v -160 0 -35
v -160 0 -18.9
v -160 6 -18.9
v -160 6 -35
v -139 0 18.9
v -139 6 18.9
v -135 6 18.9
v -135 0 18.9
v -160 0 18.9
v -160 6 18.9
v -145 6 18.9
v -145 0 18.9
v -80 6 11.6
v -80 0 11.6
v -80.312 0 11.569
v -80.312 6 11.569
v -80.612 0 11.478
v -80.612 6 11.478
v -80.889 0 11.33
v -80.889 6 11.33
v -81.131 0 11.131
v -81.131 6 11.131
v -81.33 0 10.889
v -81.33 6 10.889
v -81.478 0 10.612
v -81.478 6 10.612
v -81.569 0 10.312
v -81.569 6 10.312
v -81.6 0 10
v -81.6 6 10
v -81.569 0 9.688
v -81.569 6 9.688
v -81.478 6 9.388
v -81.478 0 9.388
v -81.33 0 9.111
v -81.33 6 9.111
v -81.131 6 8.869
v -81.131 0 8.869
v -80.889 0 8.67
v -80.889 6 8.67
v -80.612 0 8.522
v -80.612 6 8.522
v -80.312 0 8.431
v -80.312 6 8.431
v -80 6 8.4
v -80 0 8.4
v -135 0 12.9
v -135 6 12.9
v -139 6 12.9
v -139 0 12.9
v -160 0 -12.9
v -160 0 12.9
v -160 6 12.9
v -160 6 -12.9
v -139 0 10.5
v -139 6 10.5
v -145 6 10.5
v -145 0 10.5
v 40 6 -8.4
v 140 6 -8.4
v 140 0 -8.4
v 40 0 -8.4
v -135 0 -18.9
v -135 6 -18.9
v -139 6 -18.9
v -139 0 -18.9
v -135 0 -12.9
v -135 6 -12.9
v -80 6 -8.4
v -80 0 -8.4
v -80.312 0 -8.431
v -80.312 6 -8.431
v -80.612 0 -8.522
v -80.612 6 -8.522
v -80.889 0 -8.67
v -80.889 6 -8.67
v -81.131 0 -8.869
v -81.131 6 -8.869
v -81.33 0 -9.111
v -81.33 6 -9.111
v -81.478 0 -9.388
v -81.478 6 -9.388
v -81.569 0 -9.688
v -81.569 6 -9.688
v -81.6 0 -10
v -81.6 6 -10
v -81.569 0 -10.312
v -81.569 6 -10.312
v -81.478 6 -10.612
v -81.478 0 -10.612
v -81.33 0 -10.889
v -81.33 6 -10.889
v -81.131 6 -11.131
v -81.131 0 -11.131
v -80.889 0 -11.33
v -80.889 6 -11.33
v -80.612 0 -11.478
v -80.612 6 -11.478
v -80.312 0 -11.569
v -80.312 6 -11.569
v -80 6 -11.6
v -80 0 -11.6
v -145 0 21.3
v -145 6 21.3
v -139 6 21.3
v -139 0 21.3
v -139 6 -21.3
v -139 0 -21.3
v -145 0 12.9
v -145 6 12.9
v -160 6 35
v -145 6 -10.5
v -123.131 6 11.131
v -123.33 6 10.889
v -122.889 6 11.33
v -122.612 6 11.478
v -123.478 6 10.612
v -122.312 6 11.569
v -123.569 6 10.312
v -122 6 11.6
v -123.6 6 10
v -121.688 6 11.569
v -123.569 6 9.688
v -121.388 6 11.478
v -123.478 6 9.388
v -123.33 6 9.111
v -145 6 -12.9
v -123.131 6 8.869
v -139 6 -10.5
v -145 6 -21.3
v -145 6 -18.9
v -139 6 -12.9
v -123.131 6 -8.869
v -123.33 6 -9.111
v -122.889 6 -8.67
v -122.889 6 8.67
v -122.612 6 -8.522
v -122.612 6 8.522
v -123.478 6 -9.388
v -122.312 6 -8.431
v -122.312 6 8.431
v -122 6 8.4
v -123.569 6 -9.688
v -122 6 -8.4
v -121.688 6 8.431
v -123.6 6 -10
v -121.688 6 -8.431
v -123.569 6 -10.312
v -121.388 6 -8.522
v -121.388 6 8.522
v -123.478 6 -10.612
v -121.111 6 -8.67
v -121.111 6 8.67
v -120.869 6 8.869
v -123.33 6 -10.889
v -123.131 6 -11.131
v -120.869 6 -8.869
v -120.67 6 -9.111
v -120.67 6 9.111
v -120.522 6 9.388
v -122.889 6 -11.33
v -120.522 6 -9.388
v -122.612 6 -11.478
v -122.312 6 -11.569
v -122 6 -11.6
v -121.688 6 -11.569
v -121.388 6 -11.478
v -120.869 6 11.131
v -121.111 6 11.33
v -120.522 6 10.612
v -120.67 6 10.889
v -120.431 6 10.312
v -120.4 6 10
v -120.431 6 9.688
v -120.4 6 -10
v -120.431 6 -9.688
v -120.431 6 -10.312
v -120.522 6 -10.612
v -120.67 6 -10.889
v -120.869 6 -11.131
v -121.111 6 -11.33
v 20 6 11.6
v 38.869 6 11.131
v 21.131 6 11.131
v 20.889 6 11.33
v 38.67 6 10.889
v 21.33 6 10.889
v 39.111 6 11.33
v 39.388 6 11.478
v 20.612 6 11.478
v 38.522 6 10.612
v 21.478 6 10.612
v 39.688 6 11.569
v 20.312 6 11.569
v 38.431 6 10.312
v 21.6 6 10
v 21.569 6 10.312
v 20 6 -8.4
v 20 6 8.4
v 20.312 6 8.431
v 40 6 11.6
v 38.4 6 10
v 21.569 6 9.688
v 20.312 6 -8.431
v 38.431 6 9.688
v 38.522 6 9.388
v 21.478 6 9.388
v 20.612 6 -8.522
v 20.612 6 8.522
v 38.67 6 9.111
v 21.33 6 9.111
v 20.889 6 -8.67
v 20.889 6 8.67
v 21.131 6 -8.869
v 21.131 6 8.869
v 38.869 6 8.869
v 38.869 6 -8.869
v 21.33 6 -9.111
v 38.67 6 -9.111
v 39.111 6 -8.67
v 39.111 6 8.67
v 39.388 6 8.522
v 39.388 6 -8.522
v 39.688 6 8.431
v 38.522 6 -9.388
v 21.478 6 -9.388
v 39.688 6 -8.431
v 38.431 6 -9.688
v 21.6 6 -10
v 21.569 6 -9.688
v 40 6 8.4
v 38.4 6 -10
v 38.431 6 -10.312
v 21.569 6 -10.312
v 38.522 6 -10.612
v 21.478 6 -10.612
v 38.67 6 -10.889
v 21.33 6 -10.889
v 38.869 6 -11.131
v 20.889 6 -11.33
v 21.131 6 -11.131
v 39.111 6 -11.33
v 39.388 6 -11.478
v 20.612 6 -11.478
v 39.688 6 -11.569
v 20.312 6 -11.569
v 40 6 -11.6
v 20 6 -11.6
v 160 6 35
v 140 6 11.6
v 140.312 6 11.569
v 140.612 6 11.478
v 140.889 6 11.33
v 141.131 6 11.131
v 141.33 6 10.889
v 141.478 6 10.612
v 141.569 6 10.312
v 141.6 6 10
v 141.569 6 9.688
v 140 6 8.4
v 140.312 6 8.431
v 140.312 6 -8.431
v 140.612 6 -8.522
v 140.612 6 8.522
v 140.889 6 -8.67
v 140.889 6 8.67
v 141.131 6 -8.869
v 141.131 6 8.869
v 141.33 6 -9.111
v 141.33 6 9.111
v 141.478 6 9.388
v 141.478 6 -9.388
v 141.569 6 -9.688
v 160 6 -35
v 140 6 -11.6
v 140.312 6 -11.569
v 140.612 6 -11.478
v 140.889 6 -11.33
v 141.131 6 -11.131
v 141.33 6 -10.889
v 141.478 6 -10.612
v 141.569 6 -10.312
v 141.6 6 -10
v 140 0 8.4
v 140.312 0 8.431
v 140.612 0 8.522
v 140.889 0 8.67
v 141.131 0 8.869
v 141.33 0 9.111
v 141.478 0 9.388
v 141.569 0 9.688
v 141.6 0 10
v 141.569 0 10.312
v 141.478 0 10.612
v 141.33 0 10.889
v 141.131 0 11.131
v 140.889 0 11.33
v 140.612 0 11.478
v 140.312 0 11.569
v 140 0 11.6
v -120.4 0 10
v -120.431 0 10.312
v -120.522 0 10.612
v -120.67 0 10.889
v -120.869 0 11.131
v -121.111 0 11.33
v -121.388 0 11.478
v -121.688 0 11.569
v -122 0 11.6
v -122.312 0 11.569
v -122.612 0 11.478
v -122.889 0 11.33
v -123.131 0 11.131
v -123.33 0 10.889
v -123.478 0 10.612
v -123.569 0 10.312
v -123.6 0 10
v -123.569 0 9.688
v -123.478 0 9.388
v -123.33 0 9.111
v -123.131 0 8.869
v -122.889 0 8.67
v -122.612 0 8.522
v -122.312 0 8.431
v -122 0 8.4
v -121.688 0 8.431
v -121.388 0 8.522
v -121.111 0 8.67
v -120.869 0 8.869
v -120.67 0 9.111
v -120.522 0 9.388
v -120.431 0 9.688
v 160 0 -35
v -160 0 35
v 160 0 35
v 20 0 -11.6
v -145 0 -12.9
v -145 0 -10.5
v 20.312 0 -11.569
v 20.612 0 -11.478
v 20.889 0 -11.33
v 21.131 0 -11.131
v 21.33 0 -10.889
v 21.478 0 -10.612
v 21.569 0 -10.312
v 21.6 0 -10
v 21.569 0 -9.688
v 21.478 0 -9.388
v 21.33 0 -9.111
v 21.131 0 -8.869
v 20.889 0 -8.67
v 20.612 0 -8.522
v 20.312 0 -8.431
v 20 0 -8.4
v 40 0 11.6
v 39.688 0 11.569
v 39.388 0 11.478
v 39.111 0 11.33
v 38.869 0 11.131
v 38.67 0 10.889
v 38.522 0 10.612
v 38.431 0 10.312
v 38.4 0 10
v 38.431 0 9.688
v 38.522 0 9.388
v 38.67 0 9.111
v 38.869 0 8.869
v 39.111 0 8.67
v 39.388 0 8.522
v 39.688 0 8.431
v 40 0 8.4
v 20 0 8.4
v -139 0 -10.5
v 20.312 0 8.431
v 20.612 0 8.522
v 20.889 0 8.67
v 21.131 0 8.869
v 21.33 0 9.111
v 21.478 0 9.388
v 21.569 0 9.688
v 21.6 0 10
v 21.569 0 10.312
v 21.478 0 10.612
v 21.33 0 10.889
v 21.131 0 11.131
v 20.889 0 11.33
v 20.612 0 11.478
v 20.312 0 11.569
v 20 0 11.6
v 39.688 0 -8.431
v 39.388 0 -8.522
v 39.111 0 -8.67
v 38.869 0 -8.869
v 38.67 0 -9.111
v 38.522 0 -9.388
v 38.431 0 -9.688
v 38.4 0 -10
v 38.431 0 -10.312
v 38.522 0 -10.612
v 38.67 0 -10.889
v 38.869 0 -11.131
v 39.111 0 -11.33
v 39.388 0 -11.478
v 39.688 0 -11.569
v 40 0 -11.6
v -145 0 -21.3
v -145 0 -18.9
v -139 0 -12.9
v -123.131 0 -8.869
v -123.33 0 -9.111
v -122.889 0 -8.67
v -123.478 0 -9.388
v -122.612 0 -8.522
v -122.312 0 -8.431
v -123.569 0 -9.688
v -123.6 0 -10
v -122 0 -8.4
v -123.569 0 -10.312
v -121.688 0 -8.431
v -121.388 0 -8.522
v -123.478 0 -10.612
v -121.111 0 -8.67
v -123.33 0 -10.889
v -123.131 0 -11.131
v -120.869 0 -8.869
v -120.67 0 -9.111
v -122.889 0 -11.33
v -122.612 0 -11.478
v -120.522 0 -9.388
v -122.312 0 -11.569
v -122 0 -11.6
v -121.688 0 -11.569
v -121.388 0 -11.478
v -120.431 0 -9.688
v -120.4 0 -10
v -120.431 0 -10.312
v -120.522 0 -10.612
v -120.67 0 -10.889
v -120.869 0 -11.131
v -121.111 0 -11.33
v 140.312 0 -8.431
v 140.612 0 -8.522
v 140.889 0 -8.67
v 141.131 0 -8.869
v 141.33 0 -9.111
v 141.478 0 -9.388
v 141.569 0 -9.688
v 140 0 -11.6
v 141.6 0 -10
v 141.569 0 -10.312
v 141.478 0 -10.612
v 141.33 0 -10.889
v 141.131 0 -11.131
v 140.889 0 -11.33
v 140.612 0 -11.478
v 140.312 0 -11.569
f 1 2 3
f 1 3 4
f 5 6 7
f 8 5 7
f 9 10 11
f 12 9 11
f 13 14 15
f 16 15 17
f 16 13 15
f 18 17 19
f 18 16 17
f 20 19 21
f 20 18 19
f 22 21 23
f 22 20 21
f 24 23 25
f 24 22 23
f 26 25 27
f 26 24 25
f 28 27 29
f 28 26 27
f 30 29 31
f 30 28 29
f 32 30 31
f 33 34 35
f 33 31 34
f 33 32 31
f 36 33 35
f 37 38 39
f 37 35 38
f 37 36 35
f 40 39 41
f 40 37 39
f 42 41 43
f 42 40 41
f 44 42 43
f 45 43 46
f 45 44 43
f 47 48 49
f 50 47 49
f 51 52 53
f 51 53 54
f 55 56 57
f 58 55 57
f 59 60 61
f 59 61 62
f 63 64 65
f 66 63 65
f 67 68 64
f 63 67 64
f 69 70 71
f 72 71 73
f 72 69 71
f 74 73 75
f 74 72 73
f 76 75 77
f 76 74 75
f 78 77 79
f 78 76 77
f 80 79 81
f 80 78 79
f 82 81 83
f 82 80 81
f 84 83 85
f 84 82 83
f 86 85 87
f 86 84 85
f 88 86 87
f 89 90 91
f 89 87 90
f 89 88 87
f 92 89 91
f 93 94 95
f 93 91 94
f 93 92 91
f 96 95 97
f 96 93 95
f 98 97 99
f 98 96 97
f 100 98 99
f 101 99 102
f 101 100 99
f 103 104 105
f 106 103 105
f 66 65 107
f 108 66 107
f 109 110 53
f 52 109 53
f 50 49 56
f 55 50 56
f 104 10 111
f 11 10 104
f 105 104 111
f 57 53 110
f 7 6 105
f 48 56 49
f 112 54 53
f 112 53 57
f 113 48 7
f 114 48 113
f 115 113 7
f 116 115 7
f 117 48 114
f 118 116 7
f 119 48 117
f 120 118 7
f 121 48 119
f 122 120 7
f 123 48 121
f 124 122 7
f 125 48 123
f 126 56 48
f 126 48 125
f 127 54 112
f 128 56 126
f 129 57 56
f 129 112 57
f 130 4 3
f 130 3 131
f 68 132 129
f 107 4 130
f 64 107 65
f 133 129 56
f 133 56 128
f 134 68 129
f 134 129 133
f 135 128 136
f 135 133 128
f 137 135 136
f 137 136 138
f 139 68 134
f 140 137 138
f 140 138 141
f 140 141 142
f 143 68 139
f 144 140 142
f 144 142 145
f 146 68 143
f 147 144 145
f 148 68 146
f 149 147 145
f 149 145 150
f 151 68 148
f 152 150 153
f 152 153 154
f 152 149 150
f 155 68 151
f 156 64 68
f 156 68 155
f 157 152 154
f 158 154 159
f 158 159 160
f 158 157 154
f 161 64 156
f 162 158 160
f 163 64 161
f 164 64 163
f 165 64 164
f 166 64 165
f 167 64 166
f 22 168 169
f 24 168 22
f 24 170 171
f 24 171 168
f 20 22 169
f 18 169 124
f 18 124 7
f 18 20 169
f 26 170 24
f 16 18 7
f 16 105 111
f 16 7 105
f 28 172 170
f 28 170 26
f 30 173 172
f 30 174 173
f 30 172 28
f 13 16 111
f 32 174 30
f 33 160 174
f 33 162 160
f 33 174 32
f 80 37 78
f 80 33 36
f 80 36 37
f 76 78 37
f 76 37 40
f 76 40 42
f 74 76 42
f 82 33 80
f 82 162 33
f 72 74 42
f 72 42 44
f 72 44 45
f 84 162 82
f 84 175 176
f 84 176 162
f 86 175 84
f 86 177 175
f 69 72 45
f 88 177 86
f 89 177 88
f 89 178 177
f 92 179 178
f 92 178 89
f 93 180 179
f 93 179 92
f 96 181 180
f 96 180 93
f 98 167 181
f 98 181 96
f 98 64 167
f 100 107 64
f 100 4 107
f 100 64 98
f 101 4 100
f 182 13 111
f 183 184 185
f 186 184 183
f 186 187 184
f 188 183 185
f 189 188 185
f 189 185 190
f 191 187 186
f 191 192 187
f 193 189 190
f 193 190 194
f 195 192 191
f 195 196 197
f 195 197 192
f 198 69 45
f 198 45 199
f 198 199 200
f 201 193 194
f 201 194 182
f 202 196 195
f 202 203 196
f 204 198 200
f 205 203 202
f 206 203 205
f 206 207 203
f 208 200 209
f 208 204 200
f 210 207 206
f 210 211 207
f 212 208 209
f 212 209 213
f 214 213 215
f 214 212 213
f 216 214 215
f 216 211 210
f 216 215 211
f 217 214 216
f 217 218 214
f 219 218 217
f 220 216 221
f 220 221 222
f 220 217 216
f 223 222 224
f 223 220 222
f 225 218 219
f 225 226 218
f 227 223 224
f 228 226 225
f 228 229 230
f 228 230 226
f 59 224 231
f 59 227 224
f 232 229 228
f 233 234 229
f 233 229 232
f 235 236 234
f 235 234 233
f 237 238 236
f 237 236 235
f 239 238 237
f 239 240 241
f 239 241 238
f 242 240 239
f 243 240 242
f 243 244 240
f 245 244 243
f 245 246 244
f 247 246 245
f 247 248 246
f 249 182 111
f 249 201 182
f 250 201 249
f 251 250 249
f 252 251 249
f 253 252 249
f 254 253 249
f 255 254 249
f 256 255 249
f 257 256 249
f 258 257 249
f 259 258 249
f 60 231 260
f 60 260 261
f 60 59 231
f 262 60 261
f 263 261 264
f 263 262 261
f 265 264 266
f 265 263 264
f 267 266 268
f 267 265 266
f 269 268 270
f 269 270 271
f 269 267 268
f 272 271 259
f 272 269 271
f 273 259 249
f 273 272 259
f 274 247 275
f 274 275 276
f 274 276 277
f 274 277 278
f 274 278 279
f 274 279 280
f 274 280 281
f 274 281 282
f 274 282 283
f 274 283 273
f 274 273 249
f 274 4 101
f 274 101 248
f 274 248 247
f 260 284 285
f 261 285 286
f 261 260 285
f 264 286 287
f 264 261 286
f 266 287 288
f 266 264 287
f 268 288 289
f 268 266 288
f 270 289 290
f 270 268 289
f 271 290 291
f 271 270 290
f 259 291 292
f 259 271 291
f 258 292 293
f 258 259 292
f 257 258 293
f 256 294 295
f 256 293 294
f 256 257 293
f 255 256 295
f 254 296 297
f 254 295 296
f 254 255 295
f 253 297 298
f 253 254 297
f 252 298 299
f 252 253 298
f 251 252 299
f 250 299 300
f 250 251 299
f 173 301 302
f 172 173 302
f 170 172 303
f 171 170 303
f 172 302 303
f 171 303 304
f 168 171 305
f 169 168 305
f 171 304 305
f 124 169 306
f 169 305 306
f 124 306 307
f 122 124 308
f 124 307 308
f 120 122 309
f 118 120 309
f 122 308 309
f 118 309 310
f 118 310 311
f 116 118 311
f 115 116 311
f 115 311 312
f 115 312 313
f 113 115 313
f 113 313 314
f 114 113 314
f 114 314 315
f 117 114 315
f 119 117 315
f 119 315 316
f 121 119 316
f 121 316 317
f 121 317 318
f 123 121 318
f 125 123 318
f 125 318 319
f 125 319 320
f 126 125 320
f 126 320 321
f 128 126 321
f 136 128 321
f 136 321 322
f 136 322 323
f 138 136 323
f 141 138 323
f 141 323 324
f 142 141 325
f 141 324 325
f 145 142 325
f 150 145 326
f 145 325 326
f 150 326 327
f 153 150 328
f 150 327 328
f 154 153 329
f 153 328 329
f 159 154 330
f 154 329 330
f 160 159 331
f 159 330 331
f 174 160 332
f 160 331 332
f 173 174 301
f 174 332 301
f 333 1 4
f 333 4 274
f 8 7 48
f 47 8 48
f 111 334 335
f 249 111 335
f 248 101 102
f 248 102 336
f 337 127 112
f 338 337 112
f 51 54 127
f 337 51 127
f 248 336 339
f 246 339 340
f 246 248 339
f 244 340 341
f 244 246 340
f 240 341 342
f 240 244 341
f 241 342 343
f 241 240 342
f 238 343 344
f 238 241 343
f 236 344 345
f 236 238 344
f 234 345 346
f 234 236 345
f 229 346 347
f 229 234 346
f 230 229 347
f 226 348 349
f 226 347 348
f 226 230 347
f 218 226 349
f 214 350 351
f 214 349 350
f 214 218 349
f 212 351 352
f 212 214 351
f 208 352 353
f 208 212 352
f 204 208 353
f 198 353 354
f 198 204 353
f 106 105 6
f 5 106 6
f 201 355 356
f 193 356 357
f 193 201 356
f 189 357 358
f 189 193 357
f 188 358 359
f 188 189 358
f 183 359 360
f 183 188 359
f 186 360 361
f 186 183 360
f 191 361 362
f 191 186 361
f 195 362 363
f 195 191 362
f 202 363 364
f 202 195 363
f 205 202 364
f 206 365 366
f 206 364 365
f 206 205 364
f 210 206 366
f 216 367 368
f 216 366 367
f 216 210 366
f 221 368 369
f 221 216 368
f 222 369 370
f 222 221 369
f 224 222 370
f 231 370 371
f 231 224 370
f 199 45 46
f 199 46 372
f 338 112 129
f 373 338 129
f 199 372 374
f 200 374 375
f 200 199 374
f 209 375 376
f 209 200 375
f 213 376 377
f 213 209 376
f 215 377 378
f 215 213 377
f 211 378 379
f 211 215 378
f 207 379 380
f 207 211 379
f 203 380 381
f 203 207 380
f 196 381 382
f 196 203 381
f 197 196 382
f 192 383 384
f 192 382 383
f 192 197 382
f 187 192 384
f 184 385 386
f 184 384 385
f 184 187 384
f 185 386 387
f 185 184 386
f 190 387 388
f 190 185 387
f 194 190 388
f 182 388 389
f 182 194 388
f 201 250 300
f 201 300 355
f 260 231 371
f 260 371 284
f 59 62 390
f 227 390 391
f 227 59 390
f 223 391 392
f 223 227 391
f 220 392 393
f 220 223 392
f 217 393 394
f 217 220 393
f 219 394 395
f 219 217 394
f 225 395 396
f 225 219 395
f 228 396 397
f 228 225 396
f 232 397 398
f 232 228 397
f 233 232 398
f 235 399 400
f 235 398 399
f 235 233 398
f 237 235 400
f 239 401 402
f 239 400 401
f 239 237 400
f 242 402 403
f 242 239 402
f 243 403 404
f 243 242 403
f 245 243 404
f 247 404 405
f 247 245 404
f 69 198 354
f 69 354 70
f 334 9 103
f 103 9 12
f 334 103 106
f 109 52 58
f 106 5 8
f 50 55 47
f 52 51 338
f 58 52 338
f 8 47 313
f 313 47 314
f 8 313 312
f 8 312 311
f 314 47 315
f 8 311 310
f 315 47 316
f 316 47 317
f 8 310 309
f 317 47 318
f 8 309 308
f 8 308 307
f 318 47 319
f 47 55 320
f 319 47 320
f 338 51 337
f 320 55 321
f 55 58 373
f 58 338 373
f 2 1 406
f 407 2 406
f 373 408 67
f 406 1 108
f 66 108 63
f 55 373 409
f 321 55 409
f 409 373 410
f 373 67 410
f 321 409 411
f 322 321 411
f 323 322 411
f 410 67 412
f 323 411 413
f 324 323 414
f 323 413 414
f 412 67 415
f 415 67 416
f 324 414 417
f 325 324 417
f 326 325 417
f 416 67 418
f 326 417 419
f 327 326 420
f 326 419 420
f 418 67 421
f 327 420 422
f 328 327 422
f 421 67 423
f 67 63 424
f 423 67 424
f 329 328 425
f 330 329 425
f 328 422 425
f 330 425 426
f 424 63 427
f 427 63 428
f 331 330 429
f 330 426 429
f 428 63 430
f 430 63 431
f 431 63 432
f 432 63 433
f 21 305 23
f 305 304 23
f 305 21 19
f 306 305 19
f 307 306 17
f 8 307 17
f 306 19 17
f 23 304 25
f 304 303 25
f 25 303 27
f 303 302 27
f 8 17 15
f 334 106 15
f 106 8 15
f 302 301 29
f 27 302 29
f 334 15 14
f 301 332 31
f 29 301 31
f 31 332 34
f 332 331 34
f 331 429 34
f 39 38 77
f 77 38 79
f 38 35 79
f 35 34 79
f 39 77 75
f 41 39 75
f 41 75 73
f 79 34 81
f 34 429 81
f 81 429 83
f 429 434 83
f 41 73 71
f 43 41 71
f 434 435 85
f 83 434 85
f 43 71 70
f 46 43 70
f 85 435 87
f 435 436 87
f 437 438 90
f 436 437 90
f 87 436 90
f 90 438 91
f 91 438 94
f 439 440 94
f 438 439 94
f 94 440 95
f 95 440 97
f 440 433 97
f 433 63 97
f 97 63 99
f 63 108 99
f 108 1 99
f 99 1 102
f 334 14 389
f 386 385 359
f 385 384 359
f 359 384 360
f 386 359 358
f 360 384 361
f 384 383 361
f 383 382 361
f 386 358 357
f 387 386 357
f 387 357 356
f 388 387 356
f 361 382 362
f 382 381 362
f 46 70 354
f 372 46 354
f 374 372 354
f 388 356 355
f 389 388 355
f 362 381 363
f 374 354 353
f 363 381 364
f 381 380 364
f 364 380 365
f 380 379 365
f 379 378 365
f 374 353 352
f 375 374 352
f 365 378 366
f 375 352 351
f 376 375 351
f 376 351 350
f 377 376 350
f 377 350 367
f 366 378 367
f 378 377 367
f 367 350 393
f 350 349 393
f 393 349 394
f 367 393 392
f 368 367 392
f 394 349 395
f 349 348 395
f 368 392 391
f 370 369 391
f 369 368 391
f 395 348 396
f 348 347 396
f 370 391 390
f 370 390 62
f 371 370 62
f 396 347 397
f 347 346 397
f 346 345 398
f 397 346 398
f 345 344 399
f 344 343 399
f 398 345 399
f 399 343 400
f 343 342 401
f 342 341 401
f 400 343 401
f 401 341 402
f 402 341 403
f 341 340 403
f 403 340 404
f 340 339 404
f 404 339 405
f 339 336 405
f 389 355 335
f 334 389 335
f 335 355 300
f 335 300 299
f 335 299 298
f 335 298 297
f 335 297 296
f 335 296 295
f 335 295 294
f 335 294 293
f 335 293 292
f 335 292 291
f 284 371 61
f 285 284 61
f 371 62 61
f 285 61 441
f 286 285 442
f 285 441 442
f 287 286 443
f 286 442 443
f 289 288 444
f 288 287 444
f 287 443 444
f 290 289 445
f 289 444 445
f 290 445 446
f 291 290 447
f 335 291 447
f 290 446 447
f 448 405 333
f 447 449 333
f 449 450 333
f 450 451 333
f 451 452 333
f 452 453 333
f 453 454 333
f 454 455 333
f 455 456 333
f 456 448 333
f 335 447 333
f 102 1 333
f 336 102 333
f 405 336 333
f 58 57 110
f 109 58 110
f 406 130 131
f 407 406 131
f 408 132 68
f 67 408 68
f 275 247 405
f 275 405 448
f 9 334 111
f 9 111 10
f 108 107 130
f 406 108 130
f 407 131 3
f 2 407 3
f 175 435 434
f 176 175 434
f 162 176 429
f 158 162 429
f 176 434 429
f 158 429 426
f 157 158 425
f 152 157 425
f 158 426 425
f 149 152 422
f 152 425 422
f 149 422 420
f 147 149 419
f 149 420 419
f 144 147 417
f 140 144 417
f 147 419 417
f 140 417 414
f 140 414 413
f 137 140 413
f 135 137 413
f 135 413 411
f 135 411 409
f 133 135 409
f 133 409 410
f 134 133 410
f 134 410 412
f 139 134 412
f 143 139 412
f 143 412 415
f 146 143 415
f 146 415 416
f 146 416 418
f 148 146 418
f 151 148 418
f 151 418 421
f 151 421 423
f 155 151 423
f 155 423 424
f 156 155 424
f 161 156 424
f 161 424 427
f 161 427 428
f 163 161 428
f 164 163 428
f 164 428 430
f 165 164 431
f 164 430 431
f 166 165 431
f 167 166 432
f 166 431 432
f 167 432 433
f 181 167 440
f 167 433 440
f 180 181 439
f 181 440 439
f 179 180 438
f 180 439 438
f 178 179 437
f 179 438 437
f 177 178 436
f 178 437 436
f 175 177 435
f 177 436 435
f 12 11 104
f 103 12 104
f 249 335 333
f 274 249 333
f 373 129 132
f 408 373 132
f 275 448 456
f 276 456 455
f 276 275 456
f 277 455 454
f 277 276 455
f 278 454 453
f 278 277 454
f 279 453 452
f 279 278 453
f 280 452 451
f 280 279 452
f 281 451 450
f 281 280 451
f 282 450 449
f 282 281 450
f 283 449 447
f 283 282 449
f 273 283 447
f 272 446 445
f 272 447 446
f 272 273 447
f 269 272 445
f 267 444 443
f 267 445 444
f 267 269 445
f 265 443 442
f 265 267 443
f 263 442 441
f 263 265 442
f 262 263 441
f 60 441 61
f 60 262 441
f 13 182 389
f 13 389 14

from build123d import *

# Parameters (mm, degrees)
SKETCH1_W           = 320
SKETCH1_H           = 70
BOSS_EXTRUDE1_DEPTH = 6
CUT_EXTRUDE2_DEPTH  = 7
CUT_EXTRUDE3_DEPTH  = 7
SKETCH6_R           = 1.6
CUT_EXTRUDE4_DEPTH  = 7


with BuildPart() as part:
    # Sketch1 → Boss-Extrude1 (new body)
    with BuildSketch(Plane(origin=(0, 0, 0), x_dir=(1, 0, 0), z_dir=(0, 1, 0))):
        Rectangle(SKETCH1_W, SKETCH1_H)
    extrude(amount=BOSS_EXTRUDE1_DEPTH)

    # Sketch3 → Cut-Extrude2 (cut, through all)
    with BuildSketch(Plane(origin=(0, 6, 0), x_dir=(1, 0, 0), z_dir=(0, 1, 0))):
        Polygon((-160, 12.9), (-145, 12.9), (-145, 10.5), (-139, 10.5), (-139, 12.9), (-135, 12.9), (-135, 18.9), (-139, 18.9), (-139, 21.3), (-145, 21.3), (-145, 18.9), (-160, 18.9), align=None)
        Polygon((-145, -18.9), (-145, -21.3), (-139, -21.3), (-139, -18.9), (-135, -18.9), (-135, -12.9), (-139, -12.9), (-139, -10.5), (-145, -10.5), (-145, -12.9), (-160, -12.9), (-160, -18.9), align=None)
    extrude(amount=-CUT_EXTRUDE2_DEPTH, mode=Mode.SUBTRACT)

    # Sketch5 → Cut-Extrude3 (cut, through all)
    with BuildSketch(Plane(origin=(0, 6, 0), x_dir=(1, 0, 0), z_dir=(0, 1, 0))):
        with BuildLine():
            Line((40, -8.4), (140, -8.4))
            ThreePointArc((140, -8.4), (141.6, -10), (140, -11.6))
            Line((140, -11.6), (40, -11.6))
            ThreePointArc((40, -11.6), (38.4, -10), (40, -8.4))
        make_face()
        with BuildLine():
            Line((-80, -8.4), (20, -8.4))
            ThreePointArc((20, -8.4), (21.6, -10), (20, -11.6))
            Line((20, -11.6), (-80, -11.6))
            ThreePointArc((-80, -11.6), (-81.6, -10), (-80, -8.4))
        make_face()
        with BuildLine():
            Line((-80, 11.6), (20, 11.6))
            ThreePointArc((20, 11.6), (21.6, 10), (20, 8.4))
            Line((20, 8.4), (-80, 8.4))
            ThreePointArc((-80, 8.4), (-81.6, 10), (-80, 11.6))
        make_face()
        with BuildLine():
            Line((40, 11.6), (140, 11.6))
            ThreePointArc((140, 11.6), (141.6, 10), (140, 8.4))
            Line((140, 8.4), (40, 8.4))
            ThreePointArc((40, 8.4), (38.4, 10), (40, 11.6))
        make_face()
    extrude(amount=-CUT_EXTRUDE3_DEPTH, mode=Mode.SUBTRACT)

    # Sketch6 → Cut-Extrude4 (cut, through all)
    with BuildSketch(Plane.XZ):
        with Locations((-122, -10)):
            Circle(SKETCH6_R)
        with Locations((-122, 10)):
            Circle(SKETCH6_R)
    extrude(amount=-CUT_EXTRUDE4_DEPTH, mode=Mode.SUBTRACT)


solid = part.part
